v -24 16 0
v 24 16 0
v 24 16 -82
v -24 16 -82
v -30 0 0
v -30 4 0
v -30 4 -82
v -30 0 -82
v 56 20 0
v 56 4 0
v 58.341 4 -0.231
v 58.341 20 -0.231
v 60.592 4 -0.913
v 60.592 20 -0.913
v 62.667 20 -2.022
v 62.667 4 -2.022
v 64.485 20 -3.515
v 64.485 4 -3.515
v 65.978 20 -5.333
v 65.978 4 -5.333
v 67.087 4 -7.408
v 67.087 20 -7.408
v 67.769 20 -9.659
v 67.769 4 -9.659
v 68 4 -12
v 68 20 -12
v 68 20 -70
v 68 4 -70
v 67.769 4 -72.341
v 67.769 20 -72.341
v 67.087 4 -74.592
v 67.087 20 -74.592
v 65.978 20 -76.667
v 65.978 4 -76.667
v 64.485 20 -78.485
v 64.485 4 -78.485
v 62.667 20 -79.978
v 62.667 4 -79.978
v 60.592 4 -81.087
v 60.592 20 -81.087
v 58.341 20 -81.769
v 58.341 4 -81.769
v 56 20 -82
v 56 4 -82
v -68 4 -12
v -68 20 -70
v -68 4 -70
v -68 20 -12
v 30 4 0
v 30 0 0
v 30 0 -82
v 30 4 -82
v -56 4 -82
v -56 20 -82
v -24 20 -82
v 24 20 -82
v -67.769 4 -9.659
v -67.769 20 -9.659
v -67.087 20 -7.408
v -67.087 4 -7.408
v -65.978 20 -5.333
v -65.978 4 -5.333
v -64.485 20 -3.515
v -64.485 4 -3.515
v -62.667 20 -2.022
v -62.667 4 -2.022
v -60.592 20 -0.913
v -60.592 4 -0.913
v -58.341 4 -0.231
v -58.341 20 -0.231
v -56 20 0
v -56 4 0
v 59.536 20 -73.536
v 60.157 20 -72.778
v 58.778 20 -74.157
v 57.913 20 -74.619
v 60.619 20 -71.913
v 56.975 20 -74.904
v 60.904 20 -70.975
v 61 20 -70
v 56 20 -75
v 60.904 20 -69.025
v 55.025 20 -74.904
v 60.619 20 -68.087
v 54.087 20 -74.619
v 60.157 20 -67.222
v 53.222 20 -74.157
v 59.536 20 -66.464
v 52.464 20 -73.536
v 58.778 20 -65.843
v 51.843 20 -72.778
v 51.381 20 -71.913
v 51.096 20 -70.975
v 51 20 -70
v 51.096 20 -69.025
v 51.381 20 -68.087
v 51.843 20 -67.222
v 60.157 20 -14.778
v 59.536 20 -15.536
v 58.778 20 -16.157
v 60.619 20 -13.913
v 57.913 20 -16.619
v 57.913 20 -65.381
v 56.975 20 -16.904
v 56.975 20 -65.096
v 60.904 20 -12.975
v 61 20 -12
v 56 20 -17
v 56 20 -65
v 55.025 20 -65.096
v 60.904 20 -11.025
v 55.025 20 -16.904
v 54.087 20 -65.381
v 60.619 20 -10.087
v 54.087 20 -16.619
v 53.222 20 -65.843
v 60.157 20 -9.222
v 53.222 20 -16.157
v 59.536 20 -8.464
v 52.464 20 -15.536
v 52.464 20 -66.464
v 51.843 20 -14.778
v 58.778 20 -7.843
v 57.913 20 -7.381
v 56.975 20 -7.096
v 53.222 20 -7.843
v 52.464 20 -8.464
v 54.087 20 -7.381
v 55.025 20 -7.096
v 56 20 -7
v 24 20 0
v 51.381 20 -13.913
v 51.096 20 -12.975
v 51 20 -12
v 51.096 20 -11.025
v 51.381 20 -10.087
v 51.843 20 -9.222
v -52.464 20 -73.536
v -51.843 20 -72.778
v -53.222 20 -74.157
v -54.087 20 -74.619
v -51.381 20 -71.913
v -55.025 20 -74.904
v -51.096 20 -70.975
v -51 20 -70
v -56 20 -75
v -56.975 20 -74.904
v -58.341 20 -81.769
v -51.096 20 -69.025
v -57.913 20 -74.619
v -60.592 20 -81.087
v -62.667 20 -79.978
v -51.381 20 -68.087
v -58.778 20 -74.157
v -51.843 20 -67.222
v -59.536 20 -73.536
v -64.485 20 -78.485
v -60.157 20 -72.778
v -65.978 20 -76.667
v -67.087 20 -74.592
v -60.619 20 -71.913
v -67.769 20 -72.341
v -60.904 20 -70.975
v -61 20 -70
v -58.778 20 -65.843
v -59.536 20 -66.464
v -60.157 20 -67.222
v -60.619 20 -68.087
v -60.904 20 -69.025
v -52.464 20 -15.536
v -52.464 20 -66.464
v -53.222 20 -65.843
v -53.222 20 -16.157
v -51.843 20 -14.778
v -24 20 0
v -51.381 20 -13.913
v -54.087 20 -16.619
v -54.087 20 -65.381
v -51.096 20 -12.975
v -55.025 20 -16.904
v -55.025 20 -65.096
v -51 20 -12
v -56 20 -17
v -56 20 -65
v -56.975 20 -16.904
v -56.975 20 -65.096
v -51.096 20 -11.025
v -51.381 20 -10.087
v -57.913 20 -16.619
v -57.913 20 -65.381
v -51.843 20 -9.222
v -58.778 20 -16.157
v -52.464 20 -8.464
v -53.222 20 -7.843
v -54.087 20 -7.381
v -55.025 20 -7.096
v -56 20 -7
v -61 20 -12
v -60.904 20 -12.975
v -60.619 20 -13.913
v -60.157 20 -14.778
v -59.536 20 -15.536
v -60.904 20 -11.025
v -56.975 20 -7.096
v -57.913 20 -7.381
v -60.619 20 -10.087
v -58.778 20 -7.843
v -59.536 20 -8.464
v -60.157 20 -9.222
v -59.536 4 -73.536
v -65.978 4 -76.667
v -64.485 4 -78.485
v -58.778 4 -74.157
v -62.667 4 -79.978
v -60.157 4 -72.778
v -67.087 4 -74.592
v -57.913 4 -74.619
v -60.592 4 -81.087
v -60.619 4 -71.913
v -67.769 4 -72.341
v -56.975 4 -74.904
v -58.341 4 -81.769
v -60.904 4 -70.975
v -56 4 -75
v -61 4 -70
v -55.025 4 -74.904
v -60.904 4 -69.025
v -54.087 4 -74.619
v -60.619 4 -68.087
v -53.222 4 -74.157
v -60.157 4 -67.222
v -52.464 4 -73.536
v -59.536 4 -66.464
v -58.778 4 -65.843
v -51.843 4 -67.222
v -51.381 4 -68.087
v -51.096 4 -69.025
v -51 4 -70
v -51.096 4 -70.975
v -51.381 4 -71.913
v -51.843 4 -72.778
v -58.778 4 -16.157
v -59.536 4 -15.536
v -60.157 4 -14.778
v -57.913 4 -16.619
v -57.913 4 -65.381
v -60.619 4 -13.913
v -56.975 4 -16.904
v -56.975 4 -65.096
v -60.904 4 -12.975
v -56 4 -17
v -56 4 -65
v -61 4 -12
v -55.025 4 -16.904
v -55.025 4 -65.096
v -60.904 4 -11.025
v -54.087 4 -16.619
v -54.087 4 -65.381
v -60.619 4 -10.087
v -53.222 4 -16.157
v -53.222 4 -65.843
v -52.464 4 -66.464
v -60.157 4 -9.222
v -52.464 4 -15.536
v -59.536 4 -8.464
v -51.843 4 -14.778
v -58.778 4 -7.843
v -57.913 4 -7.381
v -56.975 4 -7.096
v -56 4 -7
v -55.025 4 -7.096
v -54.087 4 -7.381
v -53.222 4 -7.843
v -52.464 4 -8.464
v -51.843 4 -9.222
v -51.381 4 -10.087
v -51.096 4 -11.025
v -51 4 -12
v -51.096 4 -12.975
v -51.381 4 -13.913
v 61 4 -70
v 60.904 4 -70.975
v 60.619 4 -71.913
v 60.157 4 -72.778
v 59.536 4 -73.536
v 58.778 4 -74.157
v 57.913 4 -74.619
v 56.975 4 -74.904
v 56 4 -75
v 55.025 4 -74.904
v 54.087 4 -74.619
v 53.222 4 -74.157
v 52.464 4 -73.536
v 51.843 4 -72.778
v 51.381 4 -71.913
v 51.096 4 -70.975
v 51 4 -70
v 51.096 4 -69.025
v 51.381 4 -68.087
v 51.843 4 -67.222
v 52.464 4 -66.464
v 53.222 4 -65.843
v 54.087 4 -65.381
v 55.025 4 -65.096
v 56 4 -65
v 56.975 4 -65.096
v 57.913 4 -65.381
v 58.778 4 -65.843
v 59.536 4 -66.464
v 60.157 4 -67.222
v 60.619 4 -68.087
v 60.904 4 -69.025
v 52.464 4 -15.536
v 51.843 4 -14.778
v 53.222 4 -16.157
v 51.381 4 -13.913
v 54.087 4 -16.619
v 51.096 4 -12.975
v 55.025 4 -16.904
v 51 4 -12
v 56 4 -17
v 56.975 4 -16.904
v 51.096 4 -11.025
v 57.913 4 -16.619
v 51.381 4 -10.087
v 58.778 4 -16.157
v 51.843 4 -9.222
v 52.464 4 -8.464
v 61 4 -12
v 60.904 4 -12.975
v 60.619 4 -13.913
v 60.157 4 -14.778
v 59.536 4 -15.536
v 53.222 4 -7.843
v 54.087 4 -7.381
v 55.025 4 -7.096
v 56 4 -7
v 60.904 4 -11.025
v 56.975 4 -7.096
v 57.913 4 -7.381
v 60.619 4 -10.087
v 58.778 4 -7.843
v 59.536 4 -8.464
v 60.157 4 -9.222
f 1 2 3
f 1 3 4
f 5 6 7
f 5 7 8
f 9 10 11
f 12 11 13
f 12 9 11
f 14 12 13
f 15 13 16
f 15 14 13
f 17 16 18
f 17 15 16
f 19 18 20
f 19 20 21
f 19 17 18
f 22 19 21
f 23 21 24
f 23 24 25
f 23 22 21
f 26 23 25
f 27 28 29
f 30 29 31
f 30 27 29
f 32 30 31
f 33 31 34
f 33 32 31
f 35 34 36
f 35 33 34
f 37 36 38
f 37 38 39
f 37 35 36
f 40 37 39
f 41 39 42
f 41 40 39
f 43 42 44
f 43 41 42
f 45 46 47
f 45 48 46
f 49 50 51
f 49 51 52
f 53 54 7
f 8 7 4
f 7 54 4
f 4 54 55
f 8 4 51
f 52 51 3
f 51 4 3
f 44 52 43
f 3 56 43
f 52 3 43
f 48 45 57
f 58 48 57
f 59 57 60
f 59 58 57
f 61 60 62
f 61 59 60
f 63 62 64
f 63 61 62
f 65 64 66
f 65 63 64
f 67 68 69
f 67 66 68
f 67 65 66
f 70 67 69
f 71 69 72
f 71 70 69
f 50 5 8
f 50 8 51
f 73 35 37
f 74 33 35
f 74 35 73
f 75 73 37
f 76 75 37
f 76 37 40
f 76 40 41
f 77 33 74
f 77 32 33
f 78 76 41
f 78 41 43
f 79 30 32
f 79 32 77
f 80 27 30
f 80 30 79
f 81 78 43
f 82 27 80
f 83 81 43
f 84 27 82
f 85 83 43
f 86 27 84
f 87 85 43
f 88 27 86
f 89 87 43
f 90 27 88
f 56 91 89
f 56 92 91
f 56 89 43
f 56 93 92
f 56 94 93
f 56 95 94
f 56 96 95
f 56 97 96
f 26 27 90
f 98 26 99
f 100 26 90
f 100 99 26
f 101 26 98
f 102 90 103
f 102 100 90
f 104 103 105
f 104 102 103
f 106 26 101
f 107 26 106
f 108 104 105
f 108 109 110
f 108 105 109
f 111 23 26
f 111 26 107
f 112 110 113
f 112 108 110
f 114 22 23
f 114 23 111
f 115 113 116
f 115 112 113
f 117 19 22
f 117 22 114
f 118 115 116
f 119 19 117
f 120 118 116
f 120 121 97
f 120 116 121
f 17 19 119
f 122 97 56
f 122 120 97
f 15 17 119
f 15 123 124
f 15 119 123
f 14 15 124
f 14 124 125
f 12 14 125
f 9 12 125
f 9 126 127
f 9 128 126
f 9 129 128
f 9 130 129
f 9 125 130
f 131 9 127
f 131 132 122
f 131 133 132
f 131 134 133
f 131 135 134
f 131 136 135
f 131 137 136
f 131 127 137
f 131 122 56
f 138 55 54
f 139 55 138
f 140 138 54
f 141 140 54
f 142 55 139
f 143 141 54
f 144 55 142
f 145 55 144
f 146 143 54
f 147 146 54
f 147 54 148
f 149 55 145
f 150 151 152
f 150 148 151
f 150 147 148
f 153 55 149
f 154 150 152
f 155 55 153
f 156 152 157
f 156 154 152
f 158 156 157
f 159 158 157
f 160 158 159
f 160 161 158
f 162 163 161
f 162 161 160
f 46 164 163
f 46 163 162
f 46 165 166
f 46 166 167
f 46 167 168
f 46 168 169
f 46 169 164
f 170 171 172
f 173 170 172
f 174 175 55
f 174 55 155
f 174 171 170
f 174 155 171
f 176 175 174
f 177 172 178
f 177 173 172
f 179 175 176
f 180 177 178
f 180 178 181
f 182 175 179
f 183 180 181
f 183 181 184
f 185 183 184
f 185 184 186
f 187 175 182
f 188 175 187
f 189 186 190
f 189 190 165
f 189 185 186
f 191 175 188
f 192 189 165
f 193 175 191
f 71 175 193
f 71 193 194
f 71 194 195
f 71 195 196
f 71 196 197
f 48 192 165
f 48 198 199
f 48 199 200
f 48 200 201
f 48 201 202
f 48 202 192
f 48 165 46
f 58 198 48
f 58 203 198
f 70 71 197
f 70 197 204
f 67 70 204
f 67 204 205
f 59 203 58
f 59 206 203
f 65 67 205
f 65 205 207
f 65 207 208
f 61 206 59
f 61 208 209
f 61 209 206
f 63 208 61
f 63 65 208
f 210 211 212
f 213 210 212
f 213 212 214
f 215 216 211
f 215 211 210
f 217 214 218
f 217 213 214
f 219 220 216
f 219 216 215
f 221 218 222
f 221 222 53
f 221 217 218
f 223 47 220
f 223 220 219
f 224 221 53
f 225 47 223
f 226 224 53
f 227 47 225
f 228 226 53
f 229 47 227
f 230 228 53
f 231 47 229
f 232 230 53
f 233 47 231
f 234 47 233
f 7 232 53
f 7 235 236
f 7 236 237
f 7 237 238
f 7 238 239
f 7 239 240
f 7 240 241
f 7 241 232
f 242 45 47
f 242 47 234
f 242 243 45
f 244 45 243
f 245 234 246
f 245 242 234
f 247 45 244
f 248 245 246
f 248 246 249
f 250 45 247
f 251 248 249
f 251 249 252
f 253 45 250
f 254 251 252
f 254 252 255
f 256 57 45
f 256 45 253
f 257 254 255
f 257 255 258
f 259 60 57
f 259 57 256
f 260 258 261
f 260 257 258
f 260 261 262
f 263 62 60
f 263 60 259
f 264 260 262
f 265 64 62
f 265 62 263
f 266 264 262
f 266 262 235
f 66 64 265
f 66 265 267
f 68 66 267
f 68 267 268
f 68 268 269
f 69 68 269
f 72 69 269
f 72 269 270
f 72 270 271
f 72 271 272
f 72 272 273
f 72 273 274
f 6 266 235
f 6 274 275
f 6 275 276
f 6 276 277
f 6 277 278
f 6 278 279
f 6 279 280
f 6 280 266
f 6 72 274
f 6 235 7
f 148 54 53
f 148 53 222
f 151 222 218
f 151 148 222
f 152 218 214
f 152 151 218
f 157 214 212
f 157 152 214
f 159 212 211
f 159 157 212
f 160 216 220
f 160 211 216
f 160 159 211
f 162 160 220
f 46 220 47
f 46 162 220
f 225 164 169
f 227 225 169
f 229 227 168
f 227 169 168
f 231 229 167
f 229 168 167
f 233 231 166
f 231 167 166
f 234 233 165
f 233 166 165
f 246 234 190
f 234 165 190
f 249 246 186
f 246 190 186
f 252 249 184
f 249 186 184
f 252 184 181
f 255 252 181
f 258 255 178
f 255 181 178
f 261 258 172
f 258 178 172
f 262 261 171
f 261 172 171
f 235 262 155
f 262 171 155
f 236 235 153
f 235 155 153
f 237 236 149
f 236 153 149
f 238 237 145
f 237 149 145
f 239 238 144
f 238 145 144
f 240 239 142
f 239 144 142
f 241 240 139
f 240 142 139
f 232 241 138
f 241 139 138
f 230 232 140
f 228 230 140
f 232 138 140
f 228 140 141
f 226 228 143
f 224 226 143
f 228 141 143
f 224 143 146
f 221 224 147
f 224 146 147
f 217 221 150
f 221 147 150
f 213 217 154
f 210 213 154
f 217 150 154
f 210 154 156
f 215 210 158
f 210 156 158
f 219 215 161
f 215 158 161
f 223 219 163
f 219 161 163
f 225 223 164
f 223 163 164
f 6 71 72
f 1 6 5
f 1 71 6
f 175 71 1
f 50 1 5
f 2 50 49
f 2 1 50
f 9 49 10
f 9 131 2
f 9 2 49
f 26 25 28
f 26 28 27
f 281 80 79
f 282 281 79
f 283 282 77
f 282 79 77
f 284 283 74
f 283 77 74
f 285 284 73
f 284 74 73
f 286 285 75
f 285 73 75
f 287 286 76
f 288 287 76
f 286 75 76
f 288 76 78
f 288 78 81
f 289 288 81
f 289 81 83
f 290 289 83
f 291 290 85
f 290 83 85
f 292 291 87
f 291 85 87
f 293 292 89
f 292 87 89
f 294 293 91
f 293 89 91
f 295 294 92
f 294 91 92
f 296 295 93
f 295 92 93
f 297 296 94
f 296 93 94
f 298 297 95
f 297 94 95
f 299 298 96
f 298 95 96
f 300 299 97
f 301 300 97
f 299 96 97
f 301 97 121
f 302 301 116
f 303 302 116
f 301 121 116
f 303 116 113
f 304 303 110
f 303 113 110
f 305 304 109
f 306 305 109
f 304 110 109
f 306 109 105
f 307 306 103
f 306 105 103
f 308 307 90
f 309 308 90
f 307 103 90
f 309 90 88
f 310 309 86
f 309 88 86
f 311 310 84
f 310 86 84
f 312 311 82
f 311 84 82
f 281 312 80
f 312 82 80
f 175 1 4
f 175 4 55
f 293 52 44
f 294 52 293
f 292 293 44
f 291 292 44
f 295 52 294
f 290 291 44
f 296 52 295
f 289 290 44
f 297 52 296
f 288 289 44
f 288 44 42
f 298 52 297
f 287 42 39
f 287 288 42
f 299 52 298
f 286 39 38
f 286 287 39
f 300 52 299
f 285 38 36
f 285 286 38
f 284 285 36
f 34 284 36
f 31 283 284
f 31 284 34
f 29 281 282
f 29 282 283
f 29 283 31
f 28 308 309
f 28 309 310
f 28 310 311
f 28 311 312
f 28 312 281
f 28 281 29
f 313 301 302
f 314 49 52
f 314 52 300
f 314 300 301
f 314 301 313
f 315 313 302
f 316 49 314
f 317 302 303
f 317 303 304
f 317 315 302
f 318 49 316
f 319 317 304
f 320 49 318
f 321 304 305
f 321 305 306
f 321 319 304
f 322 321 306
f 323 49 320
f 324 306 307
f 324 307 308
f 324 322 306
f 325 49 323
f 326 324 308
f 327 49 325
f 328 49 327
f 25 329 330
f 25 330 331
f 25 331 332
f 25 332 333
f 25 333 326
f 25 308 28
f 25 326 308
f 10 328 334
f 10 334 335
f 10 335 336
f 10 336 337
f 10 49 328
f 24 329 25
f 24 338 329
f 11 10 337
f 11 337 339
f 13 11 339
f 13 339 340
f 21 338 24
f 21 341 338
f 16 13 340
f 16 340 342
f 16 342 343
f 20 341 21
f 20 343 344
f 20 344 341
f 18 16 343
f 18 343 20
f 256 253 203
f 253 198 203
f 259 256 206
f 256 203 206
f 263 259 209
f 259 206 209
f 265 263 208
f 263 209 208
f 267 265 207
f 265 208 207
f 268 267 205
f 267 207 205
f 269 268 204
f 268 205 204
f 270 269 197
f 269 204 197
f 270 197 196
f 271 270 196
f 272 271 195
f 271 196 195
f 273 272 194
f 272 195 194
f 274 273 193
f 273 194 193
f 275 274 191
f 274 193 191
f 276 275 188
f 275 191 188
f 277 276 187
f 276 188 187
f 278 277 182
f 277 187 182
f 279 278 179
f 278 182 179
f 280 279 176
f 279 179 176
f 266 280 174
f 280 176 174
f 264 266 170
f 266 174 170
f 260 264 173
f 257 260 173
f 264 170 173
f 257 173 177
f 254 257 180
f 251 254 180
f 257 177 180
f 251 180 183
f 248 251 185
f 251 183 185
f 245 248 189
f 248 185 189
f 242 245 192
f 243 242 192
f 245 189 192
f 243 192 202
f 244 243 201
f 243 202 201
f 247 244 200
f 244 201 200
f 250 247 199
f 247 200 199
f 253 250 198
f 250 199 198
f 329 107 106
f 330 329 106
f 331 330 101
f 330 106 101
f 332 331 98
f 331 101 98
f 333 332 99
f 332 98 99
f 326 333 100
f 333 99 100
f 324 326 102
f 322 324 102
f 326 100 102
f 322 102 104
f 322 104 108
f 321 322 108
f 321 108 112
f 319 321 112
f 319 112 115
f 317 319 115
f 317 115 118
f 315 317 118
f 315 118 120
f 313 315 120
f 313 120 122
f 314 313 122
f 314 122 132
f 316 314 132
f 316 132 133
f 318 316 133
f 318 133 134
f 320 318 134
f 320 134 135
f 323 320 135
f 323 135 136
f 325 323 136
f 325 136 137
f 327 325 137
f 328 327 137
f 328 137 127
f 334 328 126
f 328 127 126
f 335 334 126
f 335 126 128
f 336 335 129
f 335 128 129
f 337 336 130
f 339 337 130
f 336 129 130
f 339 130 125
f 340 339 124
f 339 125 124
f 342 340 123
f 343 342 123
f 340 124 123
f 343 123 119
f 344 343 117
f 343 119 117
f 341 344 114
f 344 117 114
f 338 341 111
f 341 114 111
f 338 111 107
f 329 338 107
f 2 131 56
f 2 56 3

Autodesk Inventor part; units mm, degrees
ref_plane "YZ Plane" through (0, 0, 0) normal (1, 0, 0) x (0, 1, 0)
ref_plane "XZ Plane" through (0, 0, 0) normal (0, 1, 0) x (-1, 0, 0)
ref_plane "XY Plane" through (0, 0, 0) normal (0, 0, 1) x (1, 0, 0)
sketch "Sketch1" plane through (0, 0, 0) normal (0, 0, 1) x (1, 0, 0)
  line L0 (0, 0) -> (30, 0)
  line L1 (30, 0) -> (30, 4)
  line L2 (30, 4) -> (68, 4)
  line L3 (68, 4) -> (68, 20)
  line L4 (68, 20) -> (24, 20)
  line L5 (24, 20) -> (24, 16)
  line L6 (24, 16) -> (0, 16)
  line L7 (0, 16) -> (0, 0)
  dimension "d0" = 30
  dimension "d1" = 4
  dimension "d2" = 38
  dimension "d3" = 16
  dimension "d4" = 44
  dimension "d5" = 4
extrude "Extrusion1" add sketch "Sketch1" against normal blind 82
sketch "Sketch2" plane through (24, 20, 0) normal (0, 1, 0) x (1, 0, 0)
  circle A0 centre (32, 12) radius 5
  circle A1 centre (32, 70) radius 5
  line L0 (44, 0) -> (44, 82) projected
  line L1 (44, 0) -> (0, 0) projected
  line L2 (0, 82) -> (44, 82) projected
  point P0 (-24, 0)
  dimension "d8" = 10
  dimension "d9" = 10
  dimension "d10" = 12
  dimension "d11" = 12
  dimension "d12" = 12
  dimension "d13" = 12
extrude "Extrusion2" cut sketch "Sketch2" against normal blind 82 contours A0
extrude "Extrusion3" cut sketch "Sketch2" against normal blind 82 contours A1
fillet "Fillet1" radius 12 1 edges at (68, 12, 0)
fillet "Fillet2" radius 12 1 edges at (68, 12, -82)
mirror "Mirror1" about plane through (0, 0, 0) normal (1, 0, 0) of "Extrusion1", "Fillet1", "Extrusion2", "Extrusion3", "Fillet2"
properties part number "topPlate" material "Iron, Malleable"
